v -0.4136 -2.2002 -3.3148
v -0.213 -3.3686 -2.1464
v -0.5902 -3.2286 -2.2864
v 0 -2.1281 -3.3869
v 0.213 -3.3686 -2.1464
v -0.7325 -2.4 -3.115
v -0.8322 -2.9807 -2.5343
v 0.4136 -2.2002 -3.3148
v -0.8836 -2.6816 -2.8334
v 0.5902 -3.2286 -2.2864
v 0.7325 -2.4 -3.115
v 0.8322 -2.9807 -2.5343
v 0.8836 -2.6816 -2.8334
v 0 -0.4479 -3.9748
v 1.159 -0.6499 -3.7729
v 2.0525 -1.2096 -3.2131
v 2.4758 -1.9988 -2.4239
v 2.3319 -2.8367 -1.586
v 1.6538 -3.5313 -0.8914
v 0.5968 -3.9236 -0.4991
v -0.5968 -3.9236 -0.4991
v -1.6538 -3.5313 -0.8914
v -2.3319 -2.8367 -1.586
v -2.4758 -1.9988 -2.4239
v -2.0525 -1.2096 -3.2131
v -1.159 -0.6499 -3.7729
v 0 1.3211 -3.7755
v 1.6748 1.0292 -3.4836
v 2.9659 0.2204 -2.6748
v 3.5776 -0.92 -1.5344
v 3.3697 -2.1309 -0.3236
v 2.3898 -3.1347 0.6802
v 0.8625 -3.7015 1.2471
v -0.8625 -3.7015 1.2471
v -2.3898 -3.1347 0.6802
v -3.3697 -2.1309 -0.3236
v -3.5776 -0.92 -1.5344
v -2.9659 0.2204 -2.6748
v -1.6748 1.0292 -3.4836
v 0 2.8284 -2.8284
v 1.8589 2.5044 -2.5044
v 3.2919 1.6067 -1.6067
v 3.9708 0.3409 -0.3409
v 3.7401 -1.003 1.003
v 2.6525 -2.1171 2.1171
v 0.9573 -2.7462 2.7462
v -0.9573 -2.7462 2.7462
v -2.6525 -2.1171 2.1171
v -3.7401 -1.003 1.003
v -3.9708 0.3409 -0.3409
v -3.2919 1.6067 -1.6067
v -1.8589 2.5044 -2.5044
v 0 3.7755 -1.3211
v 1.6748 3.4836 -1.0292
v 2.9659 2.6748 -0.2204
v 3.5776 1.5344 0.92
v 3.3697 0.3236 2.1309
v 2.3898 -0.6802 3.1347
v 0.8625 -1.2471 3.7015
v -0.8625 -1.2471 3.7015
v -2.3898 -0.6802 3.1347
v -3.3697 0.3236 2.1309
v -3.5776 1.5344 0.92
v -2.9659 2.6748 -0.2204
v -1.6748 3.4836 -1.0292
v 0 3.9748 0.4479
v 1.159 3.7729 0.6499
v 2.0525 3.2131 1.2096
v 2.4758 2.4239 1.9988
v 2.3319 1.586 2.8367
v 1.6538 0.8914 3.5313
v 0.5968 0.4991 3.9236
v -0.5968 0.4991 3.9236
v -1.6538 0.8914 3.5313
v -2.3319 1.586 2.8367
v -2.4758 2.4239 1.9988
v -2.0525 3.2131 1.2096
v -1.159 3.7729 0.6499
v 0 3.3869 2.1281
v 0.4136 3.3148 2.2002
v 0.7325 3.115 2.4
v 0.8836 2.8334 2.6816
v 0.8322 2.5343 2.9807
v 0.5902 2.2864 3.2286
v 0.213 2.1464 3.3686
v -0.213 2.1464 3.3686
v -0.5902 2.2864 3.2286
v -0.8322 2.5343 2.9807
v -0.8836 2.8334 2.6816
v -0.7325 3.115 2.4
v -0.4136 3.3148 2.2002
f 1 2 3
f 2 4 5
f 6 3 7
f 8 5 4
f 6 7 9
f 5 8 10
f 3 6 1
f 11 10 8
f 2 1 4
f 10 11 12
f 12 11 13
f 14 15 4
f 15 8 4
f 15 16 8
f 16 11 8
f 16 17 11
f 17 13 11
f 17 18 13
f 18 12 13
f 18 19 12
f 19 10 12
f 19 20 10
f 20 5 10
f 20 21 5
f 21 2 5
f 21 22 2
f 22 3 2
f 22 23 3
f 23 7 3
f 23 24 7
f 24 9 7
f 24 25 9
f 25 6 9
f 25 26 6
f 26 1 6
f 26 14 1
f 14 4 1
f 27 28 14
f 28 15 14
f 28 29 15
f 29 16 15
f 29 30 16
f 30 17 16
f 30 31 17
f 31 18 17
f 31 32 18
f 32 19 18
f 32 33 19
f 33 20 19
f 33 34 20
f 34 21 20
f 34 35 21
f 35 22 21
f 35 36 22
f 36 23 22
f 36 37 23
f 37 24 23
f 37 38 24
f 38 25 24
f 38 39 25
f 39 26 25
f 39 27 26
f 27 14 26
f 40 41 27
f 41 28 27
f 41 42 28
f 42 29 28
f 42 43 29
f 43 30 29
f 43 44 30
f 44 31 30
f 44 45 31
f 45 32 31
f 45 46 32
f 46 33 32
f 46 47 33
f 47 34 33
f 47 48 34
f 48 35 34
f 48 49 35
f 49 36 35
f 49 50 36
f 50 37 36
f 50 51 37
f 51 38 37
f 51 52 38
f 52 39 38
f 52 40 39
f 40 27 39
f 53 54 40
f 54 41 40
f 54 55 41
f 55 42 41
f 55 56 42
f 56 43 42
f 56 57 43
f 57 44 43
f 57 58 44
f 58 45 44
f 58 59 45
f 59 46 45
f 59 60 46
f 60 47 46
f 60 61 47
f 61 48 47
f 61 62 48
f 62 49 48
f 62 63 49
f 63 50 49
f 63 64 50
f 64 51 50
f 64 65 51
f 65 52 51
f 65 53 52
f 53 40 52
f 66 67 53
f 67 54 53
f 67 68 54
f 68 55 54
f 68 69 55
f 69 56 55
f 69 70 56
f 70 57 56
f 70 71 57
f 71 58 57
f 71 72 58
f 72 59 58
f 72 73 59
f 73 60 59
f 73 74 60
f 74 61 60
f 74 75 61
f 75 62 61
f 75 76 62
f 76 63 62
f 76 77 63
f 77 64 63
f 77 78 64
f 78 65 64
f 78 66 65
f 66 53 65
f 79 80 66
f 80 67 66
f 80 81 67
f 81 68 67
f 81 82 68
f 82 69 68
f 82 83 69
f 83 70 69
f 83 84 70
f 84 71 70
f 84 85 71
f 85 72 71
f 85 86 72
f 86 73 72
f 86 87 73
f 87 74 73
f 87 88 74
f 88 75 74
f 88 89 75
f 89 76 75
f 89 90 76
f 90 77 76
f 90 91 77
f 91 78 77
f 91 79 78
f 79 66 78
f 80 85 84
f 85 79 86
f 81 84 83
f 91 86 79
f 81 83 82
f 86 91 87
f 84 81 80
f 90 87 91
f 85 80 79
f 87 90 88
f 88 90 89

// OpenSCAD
// Generated by generate_scads.py
rotate([180,45,90]) {
  sphere(r=4);
}
